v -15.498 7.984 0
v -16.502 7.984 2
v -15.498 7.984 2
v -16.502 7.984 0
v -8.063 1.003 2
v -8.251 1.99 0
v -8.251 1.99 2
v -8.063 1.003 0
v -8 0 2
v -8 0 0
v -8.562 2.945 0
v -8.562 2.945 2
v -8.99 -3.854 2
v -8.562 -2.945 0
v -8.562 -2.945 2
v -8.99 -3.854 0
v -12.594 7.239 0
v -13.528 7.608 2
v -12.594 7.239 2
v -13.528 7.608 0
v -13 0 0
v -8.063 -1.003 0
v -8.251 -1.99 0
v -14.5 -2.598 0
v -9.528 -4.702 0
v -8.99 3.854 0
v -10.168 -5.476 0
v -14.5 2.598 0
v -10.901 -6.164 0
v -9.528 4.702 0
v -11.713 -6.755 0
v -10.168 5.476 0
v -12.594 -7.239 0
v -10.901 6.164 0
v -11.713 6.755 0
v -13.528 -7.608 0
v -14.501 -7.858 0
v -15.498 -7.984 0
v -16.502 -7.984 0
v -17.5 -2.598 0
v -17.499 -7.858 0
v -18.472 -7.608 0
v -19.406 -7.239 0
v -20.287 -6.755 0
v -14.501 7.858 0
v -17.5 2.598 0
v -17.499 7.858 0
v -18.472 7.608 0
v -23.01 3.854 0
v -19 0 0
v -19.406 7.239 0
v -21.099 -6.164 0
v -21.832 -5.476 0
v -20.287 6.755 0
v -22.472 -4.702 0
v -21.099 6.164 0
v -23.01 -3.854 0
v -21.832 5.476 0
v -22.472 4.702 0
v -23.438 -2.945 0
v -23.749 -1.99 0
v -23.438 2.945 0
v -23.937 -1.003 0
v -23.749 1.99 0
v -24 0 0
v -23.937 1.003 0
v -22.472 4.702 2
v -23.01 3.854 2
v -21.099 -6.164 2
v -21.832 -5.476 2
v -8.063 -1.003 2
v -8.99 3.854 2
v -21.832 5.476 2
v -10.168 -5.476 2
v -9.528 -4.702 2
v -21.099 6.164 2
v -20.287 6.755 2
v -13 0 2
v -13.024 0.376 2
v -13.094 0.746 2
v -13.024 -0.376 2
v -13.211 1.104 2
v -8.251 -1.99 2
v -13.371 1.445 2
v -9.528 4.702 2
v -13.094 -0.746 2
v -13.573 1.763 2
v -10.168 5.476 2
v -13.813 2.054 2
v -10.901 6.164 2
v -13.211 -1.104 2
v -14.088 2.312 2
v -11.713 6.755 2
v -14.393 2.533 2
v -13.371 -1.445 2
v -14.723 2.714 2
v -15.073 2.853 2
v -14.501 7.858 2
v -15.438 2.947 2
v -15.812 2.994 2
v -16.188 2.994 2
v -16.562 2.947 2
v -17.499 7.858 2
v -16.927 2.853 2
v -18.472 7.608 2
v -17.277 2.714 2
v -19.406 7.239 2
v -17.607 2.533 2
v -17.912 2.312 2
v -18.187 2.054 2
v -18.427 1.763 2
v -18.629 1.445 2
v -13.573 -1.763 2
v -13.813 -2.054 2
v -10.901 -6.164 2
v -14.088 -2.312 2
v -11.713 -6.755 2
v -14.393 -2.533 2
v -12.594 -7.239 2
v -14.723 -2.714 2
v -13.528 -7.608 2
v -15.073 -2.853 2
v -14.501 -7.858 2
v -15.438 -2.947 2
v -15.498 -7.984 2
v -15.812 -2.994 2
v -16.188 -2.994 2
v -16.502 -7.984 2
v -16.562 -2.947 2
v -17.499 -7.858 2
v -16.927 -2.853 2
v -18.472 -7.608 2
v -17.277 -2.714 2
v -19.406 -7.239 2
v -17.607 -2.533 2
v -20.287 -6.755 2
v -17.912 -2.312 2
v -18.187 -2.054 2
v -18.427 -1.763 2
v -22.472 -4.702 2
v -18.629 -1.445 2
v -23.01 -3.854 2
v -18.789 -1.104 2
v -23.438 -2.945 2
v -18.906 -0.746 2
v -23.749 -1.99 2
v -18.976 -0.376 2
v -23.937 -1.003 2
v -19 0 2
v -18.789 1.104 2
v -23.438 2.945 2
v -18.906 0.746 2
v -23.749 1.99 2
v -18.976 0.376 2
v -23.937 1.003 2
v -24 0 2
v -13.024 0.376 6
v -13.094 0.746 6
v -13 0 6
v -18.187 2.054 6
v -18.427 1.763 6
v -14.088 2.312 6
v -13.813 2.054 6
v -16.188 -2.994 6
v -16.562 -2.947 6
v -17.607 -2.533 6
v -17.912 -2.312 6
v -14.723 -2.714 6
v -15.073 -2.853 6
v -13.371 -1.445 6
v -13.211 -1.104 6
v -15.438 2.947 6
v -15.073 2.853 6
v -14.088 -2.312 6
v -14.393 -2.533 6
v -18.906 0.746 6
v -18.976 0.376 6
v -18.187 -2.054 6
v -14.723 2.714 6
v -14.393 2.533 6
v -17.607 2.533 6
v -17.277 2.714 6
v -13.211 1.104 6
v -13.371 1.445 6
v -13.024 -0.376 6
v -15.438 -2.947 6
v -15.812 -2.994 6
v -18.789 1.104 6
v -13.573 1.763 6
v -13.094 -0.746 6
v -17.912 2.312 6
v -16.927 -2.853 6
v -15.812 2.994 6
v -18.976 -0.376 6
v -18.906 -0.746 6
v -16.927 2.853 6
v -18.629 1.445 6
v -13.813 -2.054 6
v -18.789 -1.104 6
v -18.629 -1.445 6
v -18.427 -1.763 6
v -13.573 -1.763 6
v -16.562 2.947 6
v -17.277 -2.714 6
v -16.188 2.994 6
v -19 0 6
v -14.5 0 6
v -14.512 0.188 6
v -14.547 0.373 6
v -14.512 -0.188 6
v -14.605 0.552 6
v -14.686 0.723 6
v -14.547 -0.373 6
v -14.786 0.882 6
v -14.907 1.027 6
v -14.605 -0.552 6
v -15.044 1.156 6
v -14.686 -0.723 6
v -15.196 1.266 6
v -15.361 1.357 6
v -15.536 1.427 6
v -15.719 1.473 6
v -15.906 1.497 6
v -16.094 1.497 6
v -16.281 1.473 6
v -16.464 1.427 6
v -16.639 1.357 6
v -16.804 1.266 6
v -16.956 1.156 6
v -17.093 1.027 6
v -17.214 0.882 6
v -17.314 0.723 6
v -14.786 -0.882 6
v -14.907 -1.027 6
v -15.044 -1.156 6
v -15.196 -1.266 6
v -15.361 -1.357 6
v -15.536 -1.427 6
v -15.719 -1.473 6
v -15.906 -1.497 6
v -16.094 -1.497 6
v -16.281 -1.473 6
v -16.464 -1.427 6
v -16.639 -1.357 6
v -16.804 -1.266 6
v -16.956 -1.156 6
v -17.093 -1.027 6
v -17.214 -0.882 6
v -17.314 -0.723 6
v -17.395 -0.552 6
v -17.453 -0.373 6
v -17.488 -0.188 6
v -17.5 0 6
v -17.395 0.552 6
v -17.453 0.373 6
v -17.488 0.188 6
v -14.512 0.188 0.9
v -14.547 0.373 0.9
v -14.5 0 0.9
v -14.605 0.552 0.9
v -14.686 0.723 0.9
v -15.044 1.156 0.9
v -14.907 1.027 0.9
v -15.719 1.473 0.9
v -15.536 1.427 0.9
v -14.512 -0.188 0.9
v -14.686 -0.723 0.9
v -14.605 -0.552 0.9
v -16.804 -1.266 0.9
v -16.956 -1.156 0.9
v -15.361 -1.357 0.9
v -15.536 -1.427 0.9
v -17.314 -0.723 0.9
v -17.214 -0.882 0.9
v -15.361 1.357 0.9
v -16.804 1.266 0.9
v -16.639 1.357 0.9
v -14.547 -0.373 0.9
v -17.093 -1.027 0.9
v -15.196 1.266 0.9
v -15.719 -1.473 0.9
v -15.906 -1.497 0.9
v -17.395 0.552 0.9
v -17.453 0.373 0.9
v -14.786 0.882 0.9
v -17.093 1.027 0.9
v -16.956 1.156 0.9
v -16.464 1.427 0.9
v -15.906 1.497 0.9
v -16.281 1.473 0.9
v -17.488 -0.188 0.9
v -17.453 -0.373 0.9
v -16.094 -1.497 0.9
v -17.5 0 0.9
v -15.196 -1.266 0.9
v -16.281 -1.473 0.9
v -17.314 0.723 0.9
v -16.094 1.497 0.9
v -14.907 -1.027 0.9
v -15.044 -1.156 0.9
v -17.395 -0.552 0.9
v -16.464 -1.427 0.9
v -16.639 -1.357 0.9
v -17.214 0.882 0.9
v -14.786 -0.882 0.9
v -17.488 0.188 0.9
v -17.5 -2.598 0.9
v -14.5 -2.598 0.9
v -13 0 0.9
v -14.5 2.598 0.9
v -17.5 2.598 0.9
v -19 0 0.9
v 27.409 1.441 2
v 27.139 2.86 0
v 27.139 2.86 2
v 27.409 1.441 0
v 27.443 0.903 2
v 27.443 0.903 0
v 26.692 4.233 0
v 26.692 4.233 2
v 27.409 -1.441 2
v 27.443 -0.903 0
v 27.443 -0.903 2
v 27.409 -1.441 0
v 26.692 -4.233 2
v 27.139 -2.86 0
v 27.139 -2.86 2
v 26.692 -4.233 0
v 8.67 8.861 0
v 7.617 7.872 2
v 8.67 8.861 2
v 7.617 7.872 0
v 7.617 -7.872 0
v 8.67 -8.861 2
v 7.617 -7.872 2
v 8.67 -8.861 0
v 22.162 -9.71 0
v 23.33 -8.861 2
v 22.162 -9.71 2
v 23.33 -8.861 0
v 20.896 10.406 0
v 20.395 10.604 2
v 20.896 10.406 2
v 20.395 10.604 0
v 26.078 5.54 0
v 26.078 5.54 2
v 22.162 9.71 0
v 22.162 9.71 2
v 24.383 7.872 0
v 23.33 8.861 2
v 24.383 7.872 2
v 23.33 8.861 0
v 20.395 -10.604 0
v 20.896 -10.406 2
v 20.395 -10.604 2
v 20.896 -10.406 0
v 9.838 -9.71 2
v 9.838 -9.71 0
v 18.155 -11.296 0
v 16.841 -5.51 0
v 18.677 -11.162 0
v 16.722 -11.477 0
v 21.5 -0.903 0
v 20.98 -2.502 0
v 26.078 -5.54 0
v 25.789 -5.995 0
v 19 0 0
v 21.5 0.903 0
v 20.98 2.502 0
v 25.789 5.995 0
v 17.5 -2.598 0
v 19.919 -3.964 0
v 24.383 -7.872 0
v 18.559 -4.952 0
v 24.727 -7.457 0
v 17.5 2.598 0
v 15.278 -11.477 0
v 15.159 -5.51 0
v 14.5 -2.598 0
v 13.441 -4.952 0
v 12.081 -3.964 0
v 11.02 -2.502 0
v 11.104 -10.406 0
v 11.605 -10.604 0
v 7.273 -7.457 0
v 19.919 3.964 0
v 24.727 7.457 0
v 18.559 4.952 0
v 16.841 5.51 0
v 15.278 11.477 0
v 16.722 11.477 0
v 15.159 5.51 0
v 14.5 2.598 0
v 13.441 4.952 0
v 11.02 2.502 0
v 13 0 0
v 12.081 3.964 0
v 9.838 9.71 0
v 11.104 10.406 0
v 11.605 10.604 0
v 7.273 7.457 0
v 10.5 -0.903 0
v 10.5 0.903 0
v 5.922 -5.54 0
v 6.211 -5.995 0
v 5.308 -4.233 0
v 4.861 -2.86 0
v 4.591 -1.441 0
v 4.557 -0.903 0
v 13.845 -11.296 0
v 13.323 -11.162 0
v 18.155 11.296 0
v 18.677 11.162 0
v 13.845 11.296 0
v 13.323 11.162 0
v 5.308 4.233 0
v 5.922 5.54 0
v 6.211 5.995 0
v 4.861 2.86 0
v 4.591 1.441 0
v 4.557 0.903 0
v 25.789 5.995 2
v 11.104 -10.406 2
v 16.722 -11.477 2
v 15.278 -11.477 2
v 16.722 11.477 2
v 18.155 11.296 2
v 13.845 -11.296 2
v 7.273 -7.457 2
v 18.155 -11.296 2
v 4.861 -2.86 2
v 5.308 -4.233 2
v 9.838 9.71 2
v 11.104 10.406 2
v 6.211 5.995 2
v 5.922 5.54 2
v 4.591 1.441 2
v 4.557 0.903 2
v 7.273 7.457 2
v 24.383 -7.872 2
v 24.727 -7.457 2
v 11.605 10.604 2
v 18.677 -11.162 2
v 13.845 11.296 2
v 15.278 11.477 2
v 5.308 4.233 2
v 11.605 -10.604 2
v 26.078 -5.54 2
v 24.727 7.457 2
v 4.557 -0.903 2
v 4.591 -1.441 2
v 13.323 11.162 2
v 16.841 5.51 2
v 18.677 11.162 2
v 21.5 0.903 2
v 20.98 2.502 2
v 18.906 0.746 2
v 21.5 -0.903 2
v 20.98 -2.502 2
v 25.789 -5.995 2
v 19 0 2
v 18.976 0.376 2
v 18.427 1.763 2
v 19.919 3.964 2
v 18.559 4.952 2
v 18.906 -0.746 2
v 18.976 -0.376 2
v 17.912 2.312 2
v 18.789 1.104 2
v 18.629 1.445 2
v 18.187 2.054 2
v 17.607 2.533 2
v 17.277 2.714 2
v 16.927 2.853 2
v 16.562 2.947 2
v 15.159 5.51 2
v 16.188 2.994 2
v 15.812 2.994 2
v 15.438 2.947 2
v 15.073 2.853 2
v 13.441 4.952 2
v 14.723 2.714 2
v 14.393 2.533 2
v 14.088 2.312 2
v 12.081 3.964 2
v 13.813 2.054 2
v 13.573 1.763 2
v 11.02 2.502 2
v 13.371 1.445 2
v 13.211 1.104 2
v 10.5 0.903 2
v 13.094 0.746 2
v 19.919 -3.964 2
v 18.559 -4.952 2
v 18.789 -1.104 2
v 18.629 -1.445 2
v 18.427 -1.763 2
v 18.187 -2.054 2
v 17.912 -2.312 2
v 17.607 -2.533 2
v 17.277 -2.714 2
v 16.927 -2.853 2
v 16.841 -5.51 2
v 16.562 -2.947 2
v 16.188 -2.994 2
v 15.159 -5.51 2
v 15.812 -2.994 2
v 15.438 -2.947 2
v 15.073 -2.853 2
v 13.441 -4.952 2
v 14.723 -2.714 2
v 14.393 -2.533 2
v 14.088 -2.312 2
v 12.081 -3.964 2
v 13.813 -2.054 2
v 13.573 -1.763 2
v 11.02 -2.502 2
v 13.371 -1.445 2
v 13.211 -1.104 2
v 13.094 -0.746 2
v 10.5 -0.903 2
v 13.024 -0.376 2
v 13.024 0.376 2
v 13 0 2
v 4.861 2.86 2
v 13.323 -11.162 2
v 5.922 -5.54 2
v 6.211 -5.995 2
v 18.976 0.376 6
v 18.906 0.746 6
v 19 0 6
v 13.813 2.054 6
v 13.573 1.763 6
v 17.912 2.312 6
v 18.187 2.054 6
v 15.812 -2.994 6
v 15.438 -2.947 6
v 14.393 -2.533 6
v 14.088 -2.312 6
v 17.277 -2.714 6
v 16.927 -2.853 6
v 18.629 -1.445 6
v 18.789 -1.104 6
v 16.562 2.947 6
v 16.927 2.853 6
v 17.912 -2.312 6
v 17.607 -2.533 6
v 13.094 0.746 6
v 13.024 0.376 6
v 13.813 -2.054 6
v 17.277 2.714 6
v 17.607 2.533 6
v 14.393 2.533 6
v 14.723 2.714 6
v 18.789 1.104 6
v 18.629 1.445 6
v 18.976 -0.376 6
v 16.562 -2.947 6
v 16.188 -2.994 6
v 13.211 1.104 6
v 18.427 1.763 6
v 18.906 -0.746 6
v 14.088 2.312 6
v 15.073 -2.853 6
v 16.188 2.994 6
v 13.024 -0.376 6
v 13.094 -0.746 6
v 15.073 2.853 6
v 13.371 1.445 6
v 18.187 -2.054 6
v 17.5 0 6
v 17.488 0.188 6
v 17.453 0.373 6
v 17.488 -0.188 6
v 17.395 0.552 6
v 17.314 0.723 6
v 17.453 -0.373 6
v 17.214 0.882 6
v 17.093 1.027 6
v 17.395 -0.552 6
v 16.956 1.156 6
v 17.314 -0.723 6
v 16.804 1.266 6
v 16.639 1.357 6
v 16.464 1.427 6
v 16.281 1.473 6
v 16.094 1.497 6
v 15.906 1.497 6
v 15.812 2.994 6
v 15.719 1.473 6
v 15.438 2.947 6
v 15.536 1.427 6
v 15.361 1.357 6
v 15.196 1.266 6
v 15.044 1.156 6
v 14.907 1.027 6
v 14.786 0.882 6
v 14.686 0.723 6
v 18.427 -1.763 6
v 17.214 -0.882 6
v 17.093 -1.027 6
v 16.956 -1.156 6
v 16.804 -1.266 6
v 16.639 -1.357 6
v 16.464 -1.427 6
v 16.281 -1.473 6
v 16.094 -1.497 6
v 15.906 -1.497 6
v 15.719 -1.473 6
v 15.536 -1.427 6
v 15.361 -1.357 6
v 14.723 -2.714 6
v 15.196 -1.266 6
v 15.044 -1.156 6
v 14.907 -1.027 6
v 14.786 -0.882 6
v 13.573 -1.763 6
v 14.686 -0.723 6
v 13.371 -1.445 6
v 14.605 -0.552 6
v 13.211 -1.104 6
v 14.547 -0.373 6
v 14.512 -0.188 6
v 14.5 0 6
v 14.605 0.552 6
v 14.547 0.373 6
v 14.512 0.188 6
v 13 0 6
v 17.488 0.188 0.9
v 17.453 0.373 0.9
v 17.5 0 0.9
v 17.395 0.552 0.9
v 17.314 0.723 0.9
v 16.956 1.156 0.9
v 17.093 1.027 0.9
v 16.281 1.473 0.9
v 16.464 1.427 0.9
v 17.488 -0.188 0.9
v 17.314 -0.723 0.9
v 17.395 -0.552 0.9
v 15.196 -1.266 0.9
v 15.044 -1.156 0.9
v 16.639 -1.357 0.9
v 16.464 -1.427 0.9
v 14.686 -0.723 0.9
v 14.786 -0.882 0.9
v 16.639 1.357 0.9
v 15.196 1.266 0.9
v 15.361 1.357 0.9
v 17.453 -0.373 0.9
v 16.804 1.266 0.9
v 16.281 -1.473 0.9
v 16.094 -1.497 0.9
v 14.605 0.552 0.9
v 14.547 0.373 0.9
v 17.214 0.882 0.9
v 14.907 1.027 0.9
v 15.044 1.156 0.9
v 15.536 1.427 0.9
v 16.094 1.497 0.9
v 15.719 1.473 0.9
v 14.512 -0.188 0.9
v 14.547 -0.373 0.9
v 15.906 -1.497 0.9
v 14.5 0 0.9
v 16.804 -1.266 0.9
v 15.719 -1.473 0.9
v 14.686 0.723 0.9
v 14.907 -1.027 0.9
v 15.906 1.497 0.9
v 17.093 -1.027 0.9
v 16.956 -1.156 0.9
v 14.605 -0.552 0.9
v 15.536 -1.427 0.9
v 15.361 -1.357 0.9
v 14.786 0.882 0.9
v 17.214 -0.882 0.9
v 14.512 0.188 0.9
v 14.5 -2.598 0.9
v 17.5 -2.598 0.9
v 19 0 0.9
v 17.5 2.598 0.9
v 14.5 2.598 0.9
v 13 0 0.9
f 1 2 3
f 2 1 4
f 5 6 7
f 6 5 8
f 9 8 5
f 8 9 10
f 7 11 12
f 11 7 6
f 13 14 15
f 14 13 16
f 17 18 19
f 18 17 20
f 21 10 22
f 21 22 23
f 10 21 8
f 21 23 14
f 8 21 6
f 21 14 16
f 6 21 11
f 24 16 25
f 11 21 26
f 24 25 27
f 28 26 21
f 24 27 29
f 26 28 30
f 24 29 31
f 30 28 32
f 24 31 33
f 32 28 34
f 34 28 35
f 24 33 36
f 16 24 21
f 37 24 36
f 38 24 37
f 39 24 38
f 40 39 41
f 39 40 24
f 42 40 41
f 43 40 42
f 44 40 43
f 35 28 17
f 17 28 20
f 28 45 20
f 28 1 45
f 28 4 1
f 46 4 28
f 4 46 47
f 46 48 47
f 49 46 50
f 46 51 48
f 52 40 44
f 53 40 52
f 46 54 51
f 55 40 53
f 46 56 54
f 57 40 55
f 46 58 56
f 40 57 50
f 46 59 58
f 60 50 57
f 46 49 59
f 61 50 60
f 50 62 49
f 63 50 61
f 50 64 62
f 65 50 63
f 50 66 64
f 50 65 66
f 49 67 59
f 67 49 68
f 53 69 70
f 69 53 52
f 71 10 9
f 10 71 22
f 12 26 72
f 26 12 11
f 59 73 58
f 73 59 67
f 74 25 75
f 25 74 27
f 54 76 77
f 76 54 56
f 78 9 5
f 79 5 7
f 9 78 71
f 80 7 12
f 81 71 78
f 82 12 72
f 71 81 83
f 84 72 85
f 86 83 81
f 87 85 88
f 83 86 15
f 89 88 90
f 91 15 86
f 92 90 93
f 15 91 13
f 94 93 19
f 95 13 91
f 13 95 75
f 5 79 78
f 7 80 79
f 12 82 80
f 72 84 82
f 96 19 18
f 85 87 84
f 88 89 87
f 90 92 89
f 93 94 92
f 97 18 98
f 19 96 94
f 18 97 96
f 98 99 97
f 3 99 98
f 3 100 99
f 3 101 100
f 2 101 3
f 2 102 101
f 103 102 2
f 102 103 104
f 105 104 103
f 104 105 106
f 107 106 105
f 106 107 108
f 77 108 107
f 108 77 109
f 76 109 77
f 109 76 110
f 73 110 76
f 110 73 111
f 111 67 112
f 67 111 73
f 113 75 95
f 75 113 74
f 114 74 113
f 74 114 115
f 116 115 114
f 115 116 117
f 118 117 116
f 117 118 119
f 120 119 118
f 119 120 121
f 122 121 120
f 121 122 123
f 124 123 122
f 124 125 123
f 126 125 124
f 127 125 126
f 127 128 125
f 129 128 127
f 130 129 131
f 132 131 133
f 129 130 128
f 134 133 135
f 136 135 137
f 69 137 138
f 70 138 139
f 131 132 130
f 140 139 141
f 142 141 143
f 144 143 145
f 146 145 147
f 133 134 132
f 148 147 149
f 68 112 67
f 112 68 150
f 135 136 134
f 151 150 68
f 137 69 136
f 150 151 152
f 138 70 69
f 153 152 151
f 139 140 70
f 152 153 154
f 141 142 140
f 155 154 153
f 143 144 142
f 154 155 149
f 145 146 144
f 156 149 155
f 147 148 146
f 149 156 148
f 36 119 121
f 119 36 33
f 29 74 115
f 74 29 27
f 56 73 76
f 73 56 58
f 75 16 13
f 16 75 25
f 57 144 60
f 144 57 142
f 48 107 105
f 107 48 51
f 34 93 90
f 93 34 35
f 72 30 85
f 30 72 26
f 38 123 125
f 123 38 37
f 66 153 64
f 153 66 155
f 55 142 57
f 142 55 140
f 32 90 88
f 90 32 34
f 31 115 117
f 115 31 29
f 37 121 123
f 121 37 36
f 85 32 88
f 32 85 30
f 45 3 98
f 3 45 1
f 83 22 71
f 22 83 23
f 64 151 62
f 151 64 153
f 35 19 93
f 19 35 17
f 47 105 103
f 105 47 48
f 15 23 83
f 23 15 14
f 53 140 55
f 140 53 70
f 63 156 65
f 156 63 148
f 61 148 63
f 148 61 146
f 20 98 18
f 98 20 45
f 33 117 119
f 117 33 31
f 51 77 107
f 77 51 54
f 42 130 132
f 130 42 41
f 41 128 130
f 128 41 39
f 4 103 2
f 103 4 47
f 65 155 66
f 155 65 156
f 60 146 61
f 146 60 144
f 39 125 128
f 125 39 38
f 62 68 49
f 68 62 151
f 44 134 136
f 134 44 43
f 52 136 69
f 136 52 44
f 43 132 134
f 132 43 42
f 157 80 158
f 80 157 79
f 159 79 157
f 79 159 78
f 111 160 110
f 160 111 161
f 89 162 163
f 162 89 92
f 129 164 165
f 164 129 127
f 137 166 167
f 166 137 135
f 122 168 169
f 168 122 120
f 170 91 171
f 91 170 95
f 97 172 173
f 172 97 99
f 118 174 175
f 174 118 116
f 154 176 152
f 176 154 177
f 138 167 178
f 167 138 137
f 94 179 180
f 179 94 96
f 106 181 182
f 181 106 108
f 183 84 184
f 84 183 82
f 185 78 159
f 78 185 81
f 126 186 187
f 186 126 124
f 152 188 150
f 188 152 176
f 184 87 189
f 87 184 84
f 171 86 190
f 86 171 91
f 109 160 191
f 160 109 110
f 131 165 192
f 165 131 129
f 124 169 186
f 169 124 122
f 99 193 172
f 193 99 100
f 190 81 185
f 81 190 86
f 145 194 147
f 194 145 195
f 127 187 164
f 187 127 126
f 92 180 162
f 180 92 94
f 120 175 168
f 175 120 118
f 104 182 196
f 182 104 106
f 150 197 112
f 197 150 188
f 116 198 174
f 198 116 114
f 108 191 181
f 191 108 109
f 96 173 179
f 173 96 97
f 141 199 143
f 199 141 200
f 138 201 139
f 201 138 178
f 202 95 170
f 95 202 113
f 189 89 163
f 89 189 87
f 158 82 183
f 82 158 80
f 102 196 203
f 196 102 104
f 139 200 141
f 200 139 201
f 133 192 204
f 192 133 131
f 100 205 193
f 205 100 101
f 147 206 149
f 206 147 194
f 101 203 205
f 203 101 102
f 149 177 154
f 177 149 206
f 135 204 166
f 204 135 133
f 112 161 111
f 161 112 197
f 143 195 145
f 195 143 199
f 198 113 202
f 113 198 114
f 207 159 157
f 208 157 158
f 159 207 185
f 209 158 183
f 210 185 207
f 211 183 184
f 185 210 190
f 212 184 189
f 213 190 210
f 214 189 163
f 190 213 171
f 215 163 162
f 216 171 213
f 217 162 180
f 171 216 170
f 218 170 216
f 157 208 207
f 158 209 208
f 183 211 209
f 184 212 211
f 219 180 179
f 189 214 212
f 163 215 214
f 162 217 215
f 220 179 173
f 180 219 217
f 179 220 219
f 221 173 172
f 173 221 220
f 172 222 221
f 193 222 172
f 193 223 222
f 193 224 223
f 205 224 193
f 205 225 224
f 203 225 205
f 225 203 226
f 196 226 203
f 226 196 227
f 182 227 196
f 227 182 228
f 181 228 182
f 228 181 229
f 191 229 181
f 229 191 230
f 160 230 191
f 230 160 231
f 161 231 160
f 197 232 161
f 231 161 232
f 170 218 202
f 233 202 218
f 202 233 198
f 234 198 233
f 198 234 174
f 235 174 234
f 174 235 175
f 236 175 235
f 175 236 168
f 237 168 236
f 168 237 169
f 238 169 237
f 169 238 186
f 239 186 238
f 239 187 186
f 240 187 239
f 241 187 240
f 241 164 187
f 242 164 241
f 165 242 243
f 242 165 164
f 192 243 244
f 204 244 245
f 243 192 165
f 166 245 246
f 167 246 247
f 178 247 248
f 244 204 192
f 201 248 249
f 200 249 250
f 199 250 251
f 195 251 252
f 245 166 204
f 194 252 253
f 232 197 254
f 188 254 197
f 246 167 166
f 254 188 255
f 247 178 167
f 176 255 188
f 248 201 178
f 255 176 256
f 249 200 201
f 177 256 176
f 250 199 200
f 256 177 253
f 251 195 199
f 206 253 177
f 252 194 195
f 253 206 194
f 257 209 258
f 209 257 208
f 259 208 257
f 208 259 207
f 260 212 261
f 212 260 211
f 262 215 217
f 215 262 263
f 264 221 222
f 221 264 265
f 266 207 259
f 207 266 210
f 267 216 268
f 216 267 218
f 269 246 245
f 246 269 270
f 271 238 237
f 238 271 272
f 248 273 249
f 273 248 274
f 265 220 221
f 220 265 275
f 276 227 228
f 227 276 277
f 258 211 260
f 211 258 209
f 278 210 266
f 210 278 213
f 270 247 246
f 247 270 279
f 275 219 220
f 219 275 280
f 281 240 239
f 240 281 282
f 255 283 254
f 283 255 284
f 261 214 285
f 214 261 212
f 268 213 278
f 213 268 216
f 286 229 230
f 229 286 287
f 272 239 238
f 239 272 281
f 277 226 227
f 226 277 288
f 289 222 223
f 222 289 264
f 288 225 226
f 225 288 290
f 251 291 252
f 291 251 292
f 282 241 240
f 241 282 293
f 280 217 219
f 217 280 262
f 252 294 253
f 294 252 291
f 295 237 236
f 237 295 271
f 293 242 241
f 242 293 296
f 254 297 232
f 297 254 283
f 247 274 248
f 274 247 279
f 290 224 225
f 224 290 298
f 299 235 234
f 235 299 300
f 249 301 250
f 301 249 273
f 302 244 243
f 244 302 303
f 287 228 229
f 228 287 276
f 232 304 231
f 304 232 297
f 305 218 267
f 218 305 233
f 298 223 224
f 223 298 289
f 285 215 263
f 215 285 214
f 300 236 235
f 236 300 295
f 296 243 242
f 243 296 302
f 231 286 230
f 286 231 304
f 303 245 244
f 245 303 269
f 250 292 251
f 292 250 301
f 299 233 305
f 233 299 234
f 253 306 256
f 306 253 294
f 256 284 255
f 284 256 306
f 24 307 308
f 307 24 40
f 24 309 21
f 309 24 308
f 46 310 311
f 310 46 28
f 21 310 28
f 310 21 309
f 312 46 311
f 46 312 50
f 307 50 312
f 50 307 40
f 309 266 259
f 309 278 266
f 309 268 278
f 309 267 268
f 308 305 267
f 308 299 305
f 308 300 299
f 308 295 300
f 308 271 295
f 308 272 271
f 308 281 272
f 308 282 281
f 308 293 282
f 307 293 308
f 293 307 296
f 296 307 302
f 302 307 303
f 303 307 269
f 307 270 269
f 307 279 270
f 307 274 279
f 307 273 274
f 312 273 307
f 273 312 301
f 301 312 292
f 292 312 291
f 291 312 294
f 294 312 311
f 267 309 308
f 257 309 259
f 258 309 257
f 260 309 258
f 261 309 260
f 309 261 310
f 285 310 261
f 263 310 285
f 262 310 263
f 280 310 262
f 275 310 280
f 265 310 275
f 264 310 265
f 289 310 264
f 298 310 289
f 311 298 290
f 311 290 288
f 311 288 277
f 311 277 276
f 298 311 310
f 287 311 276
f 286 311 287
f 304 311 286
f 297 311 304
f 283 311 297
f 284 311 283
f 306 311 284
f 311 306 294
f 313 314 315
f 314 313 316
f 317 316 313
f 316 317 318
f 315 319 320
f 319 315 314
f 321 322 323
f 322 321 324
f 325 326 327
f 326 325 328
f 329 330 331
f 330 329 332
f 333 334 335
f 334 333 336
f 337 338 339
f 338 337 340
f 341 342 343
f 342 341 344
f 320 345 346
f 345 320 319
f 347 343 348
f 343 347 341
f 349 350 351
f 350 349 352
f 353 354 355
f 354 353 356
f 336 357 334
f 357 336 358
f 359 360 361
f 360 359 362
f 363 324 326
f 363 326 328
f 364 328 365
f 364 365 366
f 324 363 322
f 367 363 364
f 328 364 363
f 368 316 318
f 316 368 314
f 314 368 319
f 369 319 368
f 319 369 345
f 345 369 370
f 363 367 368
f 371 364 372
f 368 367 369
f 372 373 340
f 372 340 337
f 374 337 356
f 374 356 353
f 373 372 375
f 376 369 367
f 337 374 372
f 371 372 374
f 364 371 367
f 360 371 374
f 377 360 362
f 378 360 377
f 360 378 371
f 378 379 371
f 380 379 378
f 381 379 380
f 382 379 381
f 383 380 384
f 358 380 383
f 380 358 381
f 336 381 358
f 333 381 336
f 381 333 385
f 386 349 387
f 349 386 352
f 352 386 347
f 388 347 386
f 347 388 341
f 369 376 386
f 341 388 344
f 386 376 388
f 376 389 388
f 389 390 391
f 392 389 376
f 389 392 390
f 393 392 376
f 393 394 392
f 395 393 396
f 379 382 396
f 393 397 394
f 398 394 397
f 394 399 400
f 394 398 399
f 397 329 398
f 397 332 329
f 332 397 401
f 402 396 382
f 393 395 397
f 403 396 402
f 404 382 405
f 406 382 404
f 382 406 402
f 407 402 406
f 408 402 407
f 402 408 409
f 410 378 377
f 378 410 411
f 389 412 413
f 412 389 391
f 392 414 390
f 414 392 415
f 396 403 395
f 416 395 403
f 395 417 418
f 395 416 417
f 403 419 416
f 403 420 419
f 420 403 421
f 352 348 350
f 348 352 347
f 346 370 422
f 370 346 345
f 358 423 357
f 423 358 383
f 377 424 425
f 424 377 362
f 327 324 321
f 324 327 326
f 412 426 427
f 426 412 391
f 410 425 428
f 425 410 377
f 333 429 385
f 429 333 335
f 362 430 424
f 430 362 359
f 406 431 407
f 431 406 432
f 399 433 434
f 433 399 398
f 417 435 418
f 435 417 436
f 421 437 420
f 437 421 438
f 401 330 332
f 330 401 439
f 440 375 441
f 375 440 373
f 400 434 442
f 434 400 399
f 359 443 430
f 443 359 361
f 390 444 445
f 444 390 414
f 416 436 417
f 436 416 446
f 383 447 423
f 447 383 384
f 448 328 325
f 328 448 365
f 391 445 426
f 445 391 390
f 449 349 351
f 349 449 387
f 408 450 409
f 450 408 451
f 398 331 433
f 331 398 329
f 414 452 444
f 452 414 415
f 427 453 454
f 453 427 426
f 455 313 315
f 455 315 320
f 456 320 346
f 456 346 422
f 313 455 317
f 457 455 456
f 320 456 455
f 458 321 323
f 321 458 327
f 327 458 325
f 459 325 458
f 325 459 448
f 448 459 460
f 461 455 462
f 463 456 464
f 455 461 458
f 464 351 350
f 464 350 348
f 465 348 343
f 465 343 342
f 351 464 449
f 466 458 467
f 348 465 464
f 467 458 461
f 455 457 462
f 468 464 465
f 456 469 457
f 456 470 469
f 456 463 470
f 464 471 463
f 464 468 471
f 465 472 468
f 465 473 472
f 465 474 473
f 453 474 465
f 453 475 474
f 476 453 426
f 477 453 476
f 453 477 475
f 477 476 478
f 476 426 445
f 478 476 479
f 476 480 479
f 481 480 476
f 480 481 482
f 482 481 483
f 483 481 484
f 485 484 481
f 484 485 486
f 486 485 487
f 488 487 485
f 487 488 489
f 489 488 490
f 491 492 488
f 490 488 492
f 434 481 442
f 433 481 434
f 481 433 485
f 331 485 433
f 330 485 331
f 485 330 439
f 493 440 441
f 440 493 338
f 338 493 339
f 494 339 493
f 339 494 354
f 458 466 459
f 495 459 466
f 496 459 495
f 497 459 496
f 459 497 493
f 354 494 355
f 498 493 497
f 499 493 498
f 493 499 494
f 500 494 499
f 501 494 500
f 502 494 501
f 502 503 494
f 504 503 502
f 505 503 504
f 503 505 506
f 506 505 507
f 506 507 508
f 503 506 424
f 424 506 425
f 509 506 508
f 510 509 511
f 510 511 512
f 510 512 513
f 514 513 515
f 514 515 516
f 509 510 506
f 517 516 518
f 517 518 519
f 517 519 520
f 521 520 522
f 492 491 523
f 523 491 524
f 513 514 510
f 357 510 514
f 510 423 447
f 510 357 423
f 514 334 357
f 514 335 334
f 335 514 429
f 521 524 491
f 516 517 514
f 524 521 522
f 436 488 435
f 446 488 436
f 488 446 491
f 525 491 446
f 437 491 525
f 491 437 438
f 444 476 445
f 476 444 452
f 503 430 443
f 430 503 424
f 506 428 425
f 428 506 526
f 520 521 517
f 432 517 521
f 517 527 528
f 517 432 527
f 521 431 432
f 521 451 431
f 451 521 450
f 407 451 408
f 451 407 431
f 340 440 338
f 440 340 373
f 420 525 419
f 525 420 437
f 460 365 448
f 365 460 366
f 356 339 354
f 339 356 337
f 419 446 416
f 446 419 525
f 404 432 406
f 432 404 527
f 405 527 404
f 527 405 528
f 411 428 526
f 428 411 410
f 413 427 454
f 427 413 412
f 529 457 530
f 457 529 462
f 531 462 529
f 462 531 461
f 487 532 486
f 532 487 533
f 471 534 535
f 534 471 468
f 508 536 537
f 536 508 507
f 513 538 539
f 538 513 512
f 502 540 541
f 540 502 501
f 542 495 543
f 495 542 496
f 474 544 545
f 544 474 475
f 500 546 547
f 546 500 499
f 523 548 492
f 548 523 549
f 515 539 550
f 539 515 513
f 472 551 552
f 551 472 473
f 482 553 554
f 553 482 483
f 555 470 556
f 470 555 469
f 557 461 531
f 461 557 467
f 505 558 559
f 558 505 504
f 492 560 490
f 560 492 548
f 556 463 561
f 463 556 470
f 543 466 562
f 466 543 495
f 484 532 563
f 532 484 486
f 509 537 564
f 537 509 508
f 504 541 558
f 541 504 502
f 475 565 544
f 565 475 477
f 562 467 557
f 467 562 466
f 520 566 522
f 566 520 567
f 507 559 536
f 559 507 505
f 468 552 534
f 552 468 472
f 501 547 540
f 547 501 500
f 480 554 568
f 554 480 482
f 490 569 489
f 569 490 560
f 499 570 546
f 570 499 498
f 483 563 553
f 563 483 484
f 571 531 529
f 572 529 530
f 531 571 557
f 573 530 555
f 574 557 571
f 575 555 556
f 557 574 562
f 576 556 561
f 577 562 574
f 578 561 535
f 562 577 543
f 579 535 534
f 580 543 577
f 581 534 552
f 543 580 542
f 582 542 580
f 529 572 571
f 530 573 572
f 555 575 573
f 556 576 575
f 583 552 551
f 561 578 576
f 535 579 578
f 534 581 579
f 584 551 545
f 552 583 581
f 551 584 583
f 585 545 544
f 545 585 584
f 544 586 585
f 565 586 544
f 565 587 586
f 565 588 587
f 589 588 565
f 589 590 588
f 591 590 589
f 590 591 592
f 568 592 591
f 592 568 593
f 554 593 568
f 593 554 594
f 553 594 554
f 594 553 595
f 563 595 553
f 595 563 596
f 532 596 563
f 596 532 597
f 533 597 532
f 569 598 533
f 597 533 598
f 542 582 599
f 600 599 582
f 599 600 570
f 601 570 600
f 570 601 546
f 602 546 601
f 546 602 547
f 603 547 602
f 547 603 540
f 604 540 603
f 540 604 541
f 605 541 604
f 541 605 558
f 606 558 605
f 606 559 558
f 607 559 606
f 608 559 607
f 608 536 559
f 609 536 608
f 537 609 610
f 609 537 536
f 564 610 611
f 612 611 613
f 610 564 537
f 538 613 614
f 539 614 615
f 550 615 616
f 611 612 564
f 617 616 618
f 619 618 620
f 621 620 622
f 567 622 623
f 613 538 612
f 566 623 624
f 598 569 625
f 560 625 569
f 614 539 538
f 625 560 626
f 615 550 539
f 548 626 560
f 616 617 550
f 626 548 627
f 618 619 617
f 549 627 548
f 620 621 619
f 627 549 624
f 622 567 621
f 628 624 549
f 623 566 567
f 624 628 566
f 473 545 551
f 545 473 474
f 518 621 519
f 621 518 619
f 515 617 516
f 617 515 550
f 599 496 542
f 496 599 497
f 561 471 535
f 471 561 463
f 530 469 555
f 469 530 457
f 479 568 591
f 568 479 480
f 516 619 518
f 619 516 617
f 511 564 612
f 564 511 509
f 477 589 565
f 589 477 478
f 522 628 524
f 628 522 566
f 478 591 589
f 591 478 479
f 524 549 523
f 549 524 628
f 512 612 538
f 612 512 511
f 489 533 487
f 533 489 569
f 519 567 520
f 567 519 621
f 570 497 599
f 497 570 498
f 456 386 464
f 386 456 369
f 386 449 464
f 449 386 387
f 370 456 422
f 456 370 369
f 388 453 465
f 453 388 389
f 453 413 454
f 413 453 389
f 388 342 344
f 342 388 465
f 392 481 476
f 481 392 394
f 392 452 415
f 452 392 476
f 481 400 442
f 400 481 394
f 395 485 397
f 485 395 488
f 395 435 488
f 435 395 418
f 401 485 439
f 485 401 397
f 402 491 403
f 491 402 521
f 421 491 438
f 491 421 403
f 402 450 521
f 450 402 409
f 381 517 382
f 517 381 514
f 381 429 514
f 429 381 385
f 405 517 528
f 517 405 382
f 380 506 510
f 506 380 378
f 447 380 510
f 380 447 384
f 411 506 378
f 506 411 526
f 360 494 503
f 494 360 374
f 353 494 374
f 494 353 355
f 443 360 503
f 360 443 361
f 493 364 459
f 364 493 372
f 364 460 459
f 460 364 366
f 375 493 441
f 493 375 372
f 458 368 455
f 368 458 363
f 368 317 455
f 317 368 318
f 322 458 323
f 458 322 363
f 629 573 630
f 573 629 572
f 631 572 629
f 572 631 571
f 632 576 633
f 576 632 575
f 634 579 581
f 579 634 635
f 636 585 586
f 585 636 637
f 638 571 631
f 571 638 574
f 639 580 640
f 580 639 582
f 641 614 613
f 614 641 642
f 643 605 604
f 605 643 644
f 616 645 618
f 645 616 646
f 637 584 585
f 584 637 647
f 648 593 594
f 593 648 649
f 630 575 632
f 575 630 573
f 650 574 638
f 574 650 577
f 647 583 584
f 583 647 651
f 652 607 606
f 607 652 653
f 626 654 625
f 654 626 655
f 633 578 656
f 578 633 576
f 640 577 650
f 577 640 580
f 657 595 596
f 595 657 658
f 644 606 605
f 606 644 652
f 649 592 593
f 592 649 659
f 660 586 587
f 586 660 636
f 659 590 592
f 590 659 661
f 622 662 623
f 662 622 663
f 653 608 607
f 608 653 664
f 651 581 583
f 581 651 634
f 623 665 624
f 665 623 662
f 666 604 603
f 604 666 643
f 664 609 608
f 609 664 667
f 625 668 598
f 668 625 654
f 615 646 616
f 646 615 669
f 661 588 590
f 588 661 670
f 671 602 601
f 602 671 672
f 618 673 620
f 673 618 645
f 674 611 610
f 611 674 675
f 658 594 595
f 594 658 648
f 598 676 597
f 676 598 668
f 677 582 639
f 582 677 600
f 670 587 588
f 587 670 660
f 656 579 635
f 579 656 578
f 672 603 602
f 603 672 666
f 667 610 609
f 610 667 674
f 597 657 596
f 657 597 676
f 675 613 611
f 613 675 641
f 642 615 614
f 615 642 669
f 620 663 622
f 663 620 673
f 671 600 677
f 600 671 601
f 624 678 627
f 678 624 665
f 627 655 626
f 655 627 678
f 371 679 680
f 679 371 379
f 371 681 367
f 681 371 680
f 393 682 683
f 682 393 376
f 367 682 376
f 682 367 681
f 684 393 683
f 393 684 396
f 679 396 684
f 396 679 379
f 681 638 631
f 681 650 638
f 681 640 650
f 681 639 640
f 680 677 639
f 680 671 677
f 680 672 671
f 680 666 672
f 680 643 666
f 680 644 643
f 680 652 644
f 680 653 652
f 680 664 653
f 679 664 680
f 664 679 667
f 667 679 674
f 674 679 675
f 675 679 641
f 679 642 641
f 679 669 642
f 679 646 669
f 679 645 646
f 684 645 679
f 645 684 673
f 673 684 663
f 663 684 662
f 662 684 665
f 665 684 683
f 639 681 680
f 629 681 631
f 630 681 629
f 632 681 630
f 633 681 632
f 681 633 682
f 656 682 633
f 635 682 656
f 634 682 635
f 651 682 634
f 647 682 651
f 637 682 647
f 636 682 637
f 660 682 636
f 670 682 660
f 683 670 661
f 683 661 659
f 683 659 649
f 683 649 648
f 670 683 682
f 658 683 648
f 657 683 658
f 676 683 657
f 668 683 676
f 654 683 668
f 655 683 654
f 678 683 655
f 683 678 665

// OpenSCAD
WheelExternalDiameter = 16;
WheelInternalDiameter = 6;
WheelHeight = 12;

ScrewDiameter = 3;
NutExternalSize = 6;

EncoderTeeth = 10;

Mode = "Print"; // [Print, View]

/* [HIDDEN] */

$fn=50;
if(Mode == "View"){
    translate([0,0,5]) 
        rubberWheel(WheelExternalDiameter,WheelInternalDiameter,WheelHeight);
    wheelHolder(0);
    translate([0,0,10+WheelHeight]) 
        rotate(a=[180,0]) wheelHolder(EncoderTeeth);
}else{
    translate([-WheelExternalDiameter,0,0]) 
        wheelHolder(0);
    translate([WheelExternalDiameter,0,0]) 
        wheelHolder(EncoderTeeth);
}
module wheelHolder(EncoderTeeth=0){    
    h = 2;
    encSize = 7;
    s = EncoderTeeth<1 ? WheelExternalDiameter:WheelExternalDiameter+encSize;
    difference(){
        union(){
            cylinder(d=s,h=h);
            cylinder(d=WheelInternalDiameter,h=h+WheelHeight/3);
        }
        translate([0,0,-1]) 
            cylinder(d=ScrewDiameter,h=WheelHeight);
        translate([0,0,-.1])
            cylinder(d=NutExternalSize,h=1,$fn=6);            
        if(EncoderTeeth>0){
            for(t=[1:EncoderTeeth]){
                w = (PI*s)/(EncoderTeeth*4);
                rotate(a=[0,0,t*360/EncoderTeeth])                
                    translate([s/2-encSize+1,-w/2,-.1]) 
                        cube([encSize,w,h*2]);
            }
        }
    }
}

module rubberWheel(ExD,InD,h){
    difference(){
        cylinder(d=ExD,h=h);
        translate([0,0,-1]) cylinder(d=InD,h=h+2);
    }
}
